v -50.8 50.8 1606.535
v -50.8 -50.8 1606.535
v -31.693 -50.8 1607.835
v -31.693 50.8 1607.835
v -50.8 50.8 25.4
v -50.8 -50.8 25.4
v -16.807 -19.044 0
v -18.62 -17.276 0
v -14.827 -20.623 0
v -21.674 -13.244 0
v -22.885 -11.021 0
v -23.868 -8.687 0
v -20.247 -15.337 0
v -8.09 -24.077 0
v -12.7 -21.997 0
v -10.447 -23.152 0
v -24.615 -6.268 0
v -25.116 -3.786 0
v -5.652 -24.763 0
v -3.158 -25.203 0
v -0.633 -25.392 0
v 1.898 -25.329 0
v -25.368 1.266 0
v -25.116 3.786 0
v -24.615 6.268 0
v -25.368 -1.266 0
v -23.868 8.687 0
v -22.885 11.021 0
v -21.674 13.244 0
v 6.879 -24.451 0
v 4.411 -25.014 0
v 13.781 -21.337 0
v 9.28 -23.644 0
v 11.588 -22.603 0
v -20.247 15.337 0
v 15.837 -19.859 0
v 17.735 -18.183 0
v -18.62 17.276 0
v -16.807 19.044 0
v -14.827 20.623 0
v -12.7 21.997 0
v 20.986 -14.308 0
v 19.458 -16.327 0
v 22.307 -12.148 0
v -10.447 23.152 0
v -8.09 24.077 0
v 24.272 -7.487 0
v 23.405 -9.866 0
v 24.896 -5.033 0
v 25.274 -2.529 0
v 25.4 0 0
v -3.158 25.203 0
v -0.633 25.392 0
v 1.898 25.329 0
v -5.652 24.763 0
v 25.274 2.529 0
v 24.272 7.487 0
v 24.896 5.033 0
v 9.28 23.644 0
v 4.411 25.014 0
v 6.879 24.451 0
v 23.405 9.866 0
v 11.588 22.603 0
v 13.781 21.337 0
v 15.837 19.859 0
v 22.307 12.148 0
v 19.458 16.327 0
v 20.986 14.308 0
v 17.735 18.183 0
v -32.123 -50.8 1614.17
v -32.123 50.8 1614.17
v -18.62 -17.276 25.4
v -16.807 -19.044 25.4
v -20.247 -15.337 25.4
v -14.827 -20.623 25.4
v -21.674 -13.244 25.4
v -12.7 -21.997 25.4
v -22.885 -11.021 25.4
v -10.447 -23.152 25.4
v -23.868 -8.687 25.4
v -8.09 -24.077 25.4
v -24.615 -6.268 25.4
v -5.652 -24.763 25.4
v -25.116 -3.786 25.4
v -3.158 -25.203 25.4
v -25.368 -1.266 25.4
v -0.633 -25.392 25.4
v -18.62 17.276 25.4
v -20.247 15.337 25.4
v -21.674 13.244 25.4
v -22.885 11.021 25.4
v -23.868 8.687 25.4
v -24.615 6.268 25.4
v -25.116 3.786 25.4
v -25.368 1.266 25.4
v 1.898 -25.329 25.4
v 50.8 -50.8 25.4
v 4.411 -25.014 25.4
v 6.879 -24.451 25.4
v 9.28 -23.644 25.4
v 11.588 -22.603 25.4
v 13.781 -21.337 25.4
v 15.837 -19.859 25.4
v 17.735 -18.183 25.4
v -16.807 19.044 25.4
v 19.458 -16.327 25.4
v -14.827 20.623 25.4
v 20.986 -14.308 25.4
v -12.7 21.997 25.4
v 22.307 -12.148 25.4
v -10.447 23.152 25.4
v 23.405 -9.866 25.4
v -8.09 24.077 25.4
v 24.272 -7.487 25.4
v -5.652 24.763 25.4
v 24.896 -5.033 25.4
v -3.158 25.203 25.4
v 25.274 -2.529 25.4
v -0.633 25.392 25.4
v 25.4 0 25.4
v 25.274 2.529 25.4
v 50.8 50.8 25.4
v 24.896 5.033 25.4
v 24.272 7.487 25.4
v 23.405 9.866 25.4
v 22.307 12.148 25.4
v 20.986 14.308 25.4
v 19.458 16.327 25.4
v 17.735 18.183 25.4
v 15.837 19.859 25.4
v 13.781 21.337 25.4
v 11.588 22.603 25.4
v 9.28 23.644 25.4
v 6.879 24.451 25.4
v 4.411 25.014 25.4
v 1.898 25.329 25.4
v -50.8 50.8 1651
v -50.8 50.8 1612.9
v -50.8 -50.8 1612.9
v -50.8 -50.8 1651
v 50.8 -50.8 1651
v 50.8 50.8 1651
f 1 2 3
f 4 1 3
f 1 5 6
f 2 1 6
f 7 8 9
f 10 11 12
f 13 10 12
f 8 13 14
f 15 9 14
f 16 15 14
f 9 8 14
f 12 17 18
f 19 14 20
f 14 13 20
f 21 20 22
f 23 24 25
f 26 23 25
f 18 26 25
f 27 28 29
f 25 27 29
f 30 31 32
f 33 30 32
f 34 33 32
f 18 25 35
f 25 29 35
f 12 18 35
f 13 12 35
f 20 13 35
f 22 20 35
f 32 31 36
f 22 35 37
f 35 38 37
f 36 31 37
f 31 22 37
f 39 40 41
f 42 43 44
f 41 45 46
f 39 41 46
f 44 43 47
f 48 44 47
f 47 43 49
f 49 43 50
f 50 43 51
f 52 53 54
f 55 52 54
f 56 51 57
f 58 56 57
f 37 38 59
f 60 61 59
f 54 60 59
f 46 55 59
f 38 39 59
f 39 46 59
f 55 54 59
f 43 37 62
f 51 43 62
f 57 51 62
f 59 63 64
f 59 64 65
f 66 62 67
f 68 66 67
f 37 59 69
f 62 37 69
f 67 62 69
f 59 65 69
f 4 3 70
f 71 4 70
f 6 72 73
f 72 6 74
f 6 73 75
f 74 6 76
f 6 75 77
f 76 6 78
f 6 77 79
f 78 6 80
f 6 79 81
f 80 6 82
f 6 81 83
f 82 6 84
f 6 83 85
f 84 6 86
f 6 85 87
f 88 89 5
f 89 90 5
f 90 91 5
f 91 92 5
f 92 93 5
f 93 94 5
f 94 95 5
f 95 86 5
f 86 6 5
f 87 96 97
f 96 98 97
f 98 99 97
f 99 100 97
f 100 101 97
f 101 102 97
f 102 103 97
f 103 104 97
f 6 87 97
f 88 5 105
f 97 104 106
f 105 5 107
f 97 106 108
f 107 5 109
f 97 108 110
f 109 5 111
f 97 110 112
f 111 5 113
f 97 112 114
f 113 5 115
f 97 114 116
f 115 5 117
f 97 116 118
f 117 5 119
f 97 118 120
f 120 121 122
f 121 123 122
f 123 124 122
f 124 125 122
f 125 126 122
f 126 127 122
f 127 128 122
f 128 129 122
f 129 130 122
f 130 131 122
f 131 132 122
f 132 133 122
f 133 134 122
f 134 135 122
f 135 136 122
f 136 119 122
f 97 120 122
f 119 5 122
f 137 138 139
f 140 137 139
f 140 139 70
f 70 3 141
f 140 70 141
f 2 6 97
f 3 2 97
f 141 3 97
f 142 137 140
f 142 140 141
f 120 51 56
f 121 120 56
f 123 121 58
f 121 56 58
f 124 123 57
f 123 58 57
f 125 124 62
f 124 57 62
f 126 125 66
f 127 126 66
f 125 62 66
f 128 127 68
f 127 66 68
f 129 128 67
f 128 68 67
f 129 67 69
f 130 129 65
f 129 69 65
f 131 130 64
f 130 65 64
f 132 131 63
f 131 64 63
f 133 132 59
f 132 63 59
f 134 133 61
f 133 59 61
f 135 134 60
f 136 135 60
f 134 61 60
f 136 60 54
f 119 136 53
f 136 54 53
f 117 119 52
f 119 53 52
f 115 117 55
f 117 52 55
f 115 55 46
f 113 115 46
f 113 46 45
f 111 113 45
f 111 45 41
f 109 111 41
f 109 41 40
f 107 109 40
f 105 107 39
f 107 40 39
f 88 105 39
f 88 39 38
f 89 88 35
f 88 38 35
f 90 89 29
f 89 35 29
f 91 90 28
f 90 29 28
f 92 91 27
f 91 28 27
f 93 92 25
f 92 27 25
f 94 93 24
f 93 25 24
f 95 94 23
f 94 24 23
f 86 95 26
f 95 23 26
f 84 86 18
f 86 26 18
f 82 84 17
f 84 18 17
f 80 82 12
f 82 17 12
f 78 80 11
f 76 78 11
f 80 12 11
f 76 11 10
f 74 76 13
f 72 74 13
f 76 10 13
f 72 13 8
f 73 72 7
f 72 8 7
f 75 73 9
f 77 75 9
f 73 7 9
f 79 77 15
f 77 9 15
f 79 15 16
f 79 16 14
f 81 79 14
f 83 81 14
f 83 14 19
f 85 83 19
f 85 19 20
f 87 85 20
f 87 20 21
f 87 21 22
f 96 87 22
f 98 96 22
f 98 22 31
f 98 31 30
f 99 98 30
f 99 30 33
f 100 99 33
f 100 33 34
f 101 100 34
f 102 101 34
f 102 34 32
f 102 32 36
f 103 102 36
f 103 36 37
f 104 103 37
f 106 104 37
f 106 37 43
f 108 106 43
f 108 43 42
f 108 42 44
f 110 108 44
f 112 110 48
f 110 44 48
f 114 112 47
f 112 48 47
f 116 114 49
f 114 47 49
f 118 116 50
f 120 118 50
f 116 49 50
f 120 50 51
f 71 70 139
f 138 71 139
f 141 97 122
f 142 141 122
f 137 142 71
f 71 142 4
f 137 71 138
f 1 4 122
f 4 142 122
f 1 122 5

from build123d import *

# Parameters (mm, degrees)
F0_R     = 25.4
F1_DEPTH = 25.4
F3_DEPTH = 1625.6
F5_DEPTH = 101.6


with BuildPart() as f1:
    # F0 (on Top) → F1 (new body)
    with BuildSketch(Plane.XY):
        Circle(F0_R)
    extrude(amount=F1_DEPTH)

    # F2 (on face) → F3 (join)
    with BuildSketch(Plane.XY.offset(25.4)):
        Polygon((-50.8, 50.8), (-50.8, 0), (-50.8, -50.8), (50.8, -50.8), (50.8, 50.8), align=None)
    extrude(amount=F3_DEPTH)

    # F4 (on face) → F5 (cut)
    with BuildSketch(Plane.XZ.offset(50.8)):
        Polygon((-32.12333, 1614.17), (-50.8, 1612.9), (-50.8, 1606.535336), (-31.692529, 1607.83463), align=None)
    extrude(amount=-F5_DEPTH, mode=Mode.SUBTRACT)


solid = f1.part
